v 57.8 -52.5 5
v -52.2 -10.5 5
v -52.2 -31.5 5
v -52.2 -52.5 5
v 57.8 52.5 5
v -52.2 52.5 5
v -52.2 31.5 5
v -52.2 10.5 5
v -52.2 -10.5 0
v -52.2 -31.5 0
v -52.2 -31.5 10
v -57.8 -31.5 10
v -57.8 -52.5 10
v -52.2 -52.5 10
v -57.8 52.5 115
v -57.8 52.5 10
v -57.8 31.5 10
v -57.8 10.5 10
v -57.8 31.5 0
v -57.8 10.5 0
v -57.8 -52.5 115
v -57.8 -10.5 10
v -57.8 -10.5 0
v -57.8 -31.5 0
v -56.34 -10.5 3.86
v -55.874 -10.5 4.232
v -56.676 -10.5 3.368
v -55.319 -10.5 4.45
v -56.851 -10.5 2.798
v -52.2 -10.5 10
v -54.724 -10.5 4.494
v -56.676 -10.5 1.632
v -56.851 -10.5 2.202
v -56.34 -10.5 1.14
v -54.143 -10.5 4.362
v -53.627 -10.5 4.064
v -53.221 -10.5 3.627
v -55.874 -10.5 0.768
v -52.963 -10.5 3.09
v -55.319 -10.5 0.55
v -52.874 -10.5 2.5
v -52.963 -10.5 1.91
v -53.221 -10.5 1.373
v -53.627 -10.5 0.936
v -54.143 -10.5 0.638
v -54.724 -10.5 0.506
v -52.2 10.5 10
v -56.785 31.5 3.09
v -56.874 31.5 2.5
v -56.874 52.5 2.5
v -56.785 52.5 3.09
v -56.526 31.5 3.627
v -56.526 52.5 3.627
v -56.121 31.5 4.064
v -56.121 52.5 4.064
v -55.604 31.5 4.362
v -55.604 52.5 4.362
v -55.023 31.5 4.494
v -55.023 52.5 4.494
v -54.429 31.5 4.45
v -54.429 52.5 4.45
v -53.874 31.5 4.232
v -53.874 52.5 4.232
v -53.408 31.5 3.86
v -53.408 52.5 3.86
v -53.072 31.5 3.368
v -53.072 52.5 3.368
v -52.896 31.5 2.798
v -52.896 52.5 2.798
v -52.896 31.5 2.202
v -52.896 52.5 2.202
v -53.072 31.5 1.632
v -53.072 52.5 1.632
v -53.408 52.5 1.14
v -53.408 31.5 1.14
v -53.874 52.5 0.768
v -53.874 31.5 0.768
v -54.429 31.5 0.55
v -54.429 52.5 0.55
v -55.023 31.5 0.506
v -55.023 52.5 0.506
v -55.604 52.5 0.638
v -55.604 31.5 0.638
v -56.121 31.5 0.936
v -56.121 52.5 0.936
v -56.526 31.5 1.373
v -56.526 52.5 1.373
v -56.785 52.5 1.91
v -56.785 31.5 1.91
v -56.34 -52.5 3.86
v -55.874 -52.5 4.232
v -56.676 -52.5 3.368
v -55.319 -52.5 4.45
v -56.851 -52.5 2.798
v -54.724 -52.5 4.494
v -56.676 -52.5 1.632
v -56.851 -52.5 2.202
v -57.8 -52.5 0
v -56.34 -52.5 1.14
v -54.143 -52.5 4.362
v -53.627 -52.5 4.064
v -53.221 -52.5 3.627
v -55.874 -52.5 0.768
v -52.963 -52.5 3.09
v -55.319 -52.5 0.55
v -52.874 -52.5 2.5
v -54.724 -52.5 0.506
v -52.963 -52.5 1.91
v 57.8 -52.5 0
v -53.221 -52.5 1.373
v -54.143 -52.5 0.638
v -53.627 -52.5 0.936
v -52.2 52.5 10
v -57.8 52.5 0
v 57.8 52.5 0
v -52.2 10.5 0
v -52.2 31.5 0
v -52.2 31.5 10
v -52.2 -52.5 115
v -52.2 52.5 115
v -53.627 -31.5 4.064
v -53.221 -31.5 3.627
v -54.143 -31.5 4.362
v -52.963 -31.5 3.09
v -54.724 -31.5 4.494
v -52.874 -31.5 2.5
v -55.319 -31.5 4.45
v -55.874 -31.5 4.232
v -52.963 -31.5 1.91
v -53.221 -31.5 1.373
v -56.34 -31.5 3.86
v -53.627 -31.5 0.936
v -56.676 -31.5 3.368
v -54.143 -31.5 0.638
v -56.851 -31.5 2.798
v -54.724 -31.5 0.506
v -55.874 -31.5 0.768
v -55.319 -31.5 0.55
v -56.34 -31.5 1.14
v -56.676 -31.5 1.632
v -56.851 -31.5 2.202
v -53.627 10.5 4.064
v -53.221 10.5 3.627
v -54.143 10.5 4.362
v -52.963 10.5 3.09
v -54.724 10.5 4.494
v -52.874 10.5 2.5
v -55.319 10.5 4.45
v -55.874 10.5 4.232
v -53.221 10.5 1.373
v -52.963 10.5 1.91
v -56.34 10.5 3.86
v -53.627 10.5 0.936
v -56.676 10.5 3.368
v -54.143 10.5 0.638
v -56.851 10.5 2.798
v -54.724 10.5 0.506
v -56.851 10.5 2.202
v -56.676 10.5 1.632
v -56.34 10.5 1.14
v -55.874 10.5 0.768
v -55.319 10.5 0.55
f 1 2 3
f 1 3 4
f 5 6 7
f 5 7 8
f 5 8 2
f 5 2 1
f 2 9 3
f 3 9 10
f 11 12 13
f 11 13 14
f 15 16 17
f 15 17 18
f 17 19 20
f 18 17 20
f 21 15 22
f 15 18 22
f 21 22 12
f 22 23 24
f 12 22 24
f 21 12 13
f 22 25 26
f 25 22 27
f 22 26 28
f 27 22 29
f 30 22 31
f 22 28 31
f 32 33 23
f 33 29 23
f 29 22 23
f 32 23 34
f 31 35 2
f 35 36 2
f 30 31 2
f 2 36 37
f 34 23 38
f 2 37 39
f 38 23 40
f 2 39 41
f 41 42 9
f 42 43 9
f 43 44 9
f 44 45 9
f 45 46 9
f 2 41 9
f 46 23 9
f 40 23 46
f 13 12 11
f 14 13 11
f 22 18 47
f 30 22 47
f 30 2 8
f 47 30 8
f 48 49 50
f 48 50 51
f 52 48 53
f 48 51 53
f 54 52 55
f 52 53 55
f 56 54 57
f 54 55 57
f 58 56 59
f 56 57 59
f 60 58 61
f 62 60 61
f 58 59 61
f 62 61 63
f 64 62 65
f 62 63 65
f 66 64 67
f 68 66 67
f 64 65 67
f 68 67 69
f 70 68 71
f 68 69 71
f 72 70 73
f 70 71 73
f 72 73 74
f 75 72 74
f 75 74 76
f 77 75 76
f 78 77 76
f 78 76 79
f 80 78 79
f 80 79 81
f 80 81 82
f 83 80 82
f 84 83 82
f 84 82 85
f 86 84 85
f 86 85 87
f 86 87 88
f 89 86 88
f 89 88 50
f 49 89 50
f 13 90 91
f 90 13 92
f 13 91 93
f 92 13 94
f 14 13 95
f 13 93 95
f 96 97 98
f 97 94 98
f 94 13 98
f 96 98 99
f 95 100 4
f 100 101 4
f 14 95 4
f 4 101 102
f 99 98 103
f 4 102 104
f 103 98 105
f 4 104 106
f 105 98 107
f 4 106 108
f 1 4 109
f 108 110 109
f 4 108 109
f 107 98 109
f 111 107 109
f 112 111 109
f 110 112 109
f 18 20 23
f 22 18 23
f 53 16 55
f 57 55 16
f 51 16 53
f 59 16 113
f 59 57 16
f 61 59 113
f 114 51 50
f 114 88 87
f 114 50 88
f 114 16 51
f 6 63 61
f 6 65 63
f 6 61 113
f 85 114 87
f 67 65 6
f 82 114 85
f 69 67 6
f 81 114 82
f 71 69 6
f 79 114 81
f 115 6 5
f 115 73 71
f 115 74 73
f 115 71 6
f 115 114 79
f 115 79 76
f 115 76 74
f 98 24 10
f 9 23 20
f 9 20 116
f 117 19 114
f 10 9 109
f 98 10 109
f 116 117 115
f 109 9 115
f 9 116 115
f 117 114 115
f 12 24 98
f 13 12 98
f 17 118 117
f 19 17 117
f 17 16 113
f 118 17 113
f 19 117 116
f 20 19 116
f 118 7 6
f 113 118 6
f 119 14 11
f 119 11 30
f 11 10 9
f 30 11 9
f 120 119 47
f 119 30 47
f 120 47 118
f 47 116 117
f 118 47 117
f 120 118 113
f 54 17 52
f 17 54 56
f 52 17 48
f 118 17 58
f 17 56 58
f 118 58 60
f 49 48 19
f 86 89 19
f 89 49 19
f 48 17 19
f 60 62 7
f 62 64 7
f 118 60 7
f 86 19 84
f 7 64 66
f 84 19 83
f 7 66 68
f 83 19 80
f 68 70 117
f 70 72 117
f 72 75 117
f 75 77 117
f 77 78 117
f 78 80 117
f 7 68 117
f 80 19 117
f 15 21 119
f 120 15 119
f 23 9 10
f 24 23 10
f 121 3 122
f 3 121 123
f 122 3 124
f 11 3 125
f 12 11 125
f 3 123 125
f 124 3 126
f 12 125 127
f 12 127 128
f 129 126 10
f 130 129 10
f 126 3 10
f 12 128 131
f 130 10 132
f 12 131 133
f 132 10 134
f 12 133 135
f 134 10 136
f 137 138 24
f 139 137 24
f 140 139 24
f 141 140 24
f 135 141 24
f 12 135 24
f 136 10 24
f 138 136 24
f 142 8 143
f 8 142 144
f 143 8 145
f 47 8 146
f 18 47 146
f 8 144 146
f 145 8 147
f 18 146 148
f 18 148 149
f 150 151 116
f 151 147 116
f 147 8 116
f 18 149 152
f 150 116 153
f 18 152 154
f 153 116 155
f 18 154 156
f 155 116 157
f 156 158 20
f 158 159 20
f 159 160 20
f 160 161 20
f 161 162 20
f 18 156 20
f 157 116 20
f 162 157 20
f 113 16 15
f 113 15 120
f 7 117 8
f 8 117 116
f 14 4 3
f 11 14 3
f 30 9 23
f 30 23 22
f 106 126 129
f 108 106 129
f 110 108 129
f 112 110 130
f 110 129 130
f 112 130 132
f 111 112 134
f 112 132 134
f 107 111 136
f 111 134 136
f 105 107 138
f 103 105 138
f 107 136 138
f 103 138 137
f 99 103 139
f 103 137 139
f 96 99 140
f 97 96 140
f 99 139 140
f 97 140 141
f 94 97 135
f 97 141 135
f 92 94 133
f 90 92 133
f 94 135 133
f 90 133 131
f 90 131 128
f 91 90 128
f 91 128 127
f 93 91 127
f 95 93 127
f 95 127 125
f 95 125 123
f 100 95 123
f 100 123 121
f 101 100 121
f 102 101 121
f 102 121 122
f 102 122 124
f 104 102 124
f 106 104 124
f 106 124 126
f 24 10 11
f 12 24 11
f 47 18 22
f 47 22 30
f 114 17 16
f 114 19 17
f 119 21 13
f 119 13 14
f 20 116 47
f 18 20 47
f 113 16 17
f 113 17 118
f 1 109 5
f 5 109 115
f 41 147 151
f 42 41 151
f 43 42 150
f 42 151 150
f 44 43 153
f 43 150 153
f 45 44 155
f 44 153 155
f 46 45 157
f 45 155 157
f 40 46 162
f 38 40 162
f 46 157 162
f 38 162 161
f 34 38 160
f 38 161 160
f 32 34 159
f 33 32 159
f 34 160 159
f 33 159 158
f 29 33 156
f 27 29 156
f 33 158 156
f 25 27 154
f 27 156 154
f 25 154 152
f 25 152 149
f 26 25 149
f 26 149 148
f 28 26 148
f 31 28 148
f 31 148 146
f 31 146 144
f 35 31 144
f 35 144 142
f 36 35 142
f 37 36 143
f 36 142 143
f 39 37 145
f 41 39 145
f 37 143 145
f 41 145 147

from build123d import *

# Parameters (mm, degrees)
F1_DEPTH  = 5
F3_D      = 4
F3_DEPTH  = 84.001
F4_D      = 4
F5_W      = 5.6
F5_H      = 21
F6_DEPTH  = 5
F7_W      = 21
F7_H      = 5
F8_DEPTH  = 5.6
F7_H_2    = 10
F9_W      = 5.6
F9_H      = 21
F10_DEPTH = 105


with BuildPart() as f1:
    # F0 (on Top) → F1 (new body)
    with BuildSketch(Plane.XY):
        Polygon((57.8, -52.5), (57.8, 52.5), (-57.8, 52.5), (-57.8, 31.5), (-52.2, 31.5), (-52.2, 10.5), (-57.8, 10.5), (-57.8, -10.5), (-52.2, -10.5), (-52.2, -31.5), (-57.8, -31.5), (-57.8, -52.5), align=None)
    extrude(amount=F1_DEPTH)

    # F3 (through all, one way)
    with BuildSketch(Plane(origin=(0, 31.5, 0), x_dir=(1, 0, 0), z_dir=(0, 1, 0))):
        with Locations((-54.8736937344, -2.5)):
            Circle(F3_D / 2)
    extrude(amount=-F3_DEPTH, mode=Mode.SUBTRACT)

    # F4 (through all)
    with Locations(Plane.XZ.offset(-31.5)):
        with Locations((-54.8736937344, 2.5)):
            Hole(F4_D / 2)

    # F5 (on face) → F6 (join)
    with BuildSketch(Plane.XY.offset(5)):
        with Locations((-55, 42)):
            Rectangle(F5_W, F5_H)
        with Locations((-55, 0)):
            Rectangle(F5_W, F5_H)
        with Locations((-55, -42)):
            Rectangle(F5_W, F5_H)
    extrude(amount=F6_DEPTH)


with BuildPart() as f8:
    # F7 (on face) → F8 (new body)
    with BuildSketch(Plane(origin=(-52.2, 0, 0), x_dir=(0, -1, 0), z_dir=(-1, 0, 0))):
        with Locations((-21, 7.5)):
            Rectangle(F7_W, F7_H)
        with Locations((-21, 2.5)):
            Rectangle(F7_W, F7_H)
    extrude(amount=F8_DEPTH)



with BuildPart() as f8b:
    # F7 (on face) → F8, piece 2 (new body)
    with BuildSketch(Plane(origin=(-52.2, 0, 0), x_dir=(0, -1, 0), z_dir=(-1, 0, 0))):
        with Locations((21, 5)):
            Rectangle(F7_W, F7_H_2)
    extrude(amount=F8_DEPTH)


with BuildPart() as f8_1:
    add(f8.part)

    add(f8b.part)  # F10 merges F8b
    # F9 (on face) → F10 (join)
    with BuildSketch(Plane.XY.offset(10)):
        with Locations((-55, 42)):
            Rectangle(F9_W, F9_H)
        Polygon((-57.8, 31.5), (-57.8, -31.5), (-57.8, -52.5), (-52.2, -52.5), (-52.2, 31.5), align=None)
    extrude(amount=F10_DEPTH)


solid = Compound([f1.part, f8_1.part])
